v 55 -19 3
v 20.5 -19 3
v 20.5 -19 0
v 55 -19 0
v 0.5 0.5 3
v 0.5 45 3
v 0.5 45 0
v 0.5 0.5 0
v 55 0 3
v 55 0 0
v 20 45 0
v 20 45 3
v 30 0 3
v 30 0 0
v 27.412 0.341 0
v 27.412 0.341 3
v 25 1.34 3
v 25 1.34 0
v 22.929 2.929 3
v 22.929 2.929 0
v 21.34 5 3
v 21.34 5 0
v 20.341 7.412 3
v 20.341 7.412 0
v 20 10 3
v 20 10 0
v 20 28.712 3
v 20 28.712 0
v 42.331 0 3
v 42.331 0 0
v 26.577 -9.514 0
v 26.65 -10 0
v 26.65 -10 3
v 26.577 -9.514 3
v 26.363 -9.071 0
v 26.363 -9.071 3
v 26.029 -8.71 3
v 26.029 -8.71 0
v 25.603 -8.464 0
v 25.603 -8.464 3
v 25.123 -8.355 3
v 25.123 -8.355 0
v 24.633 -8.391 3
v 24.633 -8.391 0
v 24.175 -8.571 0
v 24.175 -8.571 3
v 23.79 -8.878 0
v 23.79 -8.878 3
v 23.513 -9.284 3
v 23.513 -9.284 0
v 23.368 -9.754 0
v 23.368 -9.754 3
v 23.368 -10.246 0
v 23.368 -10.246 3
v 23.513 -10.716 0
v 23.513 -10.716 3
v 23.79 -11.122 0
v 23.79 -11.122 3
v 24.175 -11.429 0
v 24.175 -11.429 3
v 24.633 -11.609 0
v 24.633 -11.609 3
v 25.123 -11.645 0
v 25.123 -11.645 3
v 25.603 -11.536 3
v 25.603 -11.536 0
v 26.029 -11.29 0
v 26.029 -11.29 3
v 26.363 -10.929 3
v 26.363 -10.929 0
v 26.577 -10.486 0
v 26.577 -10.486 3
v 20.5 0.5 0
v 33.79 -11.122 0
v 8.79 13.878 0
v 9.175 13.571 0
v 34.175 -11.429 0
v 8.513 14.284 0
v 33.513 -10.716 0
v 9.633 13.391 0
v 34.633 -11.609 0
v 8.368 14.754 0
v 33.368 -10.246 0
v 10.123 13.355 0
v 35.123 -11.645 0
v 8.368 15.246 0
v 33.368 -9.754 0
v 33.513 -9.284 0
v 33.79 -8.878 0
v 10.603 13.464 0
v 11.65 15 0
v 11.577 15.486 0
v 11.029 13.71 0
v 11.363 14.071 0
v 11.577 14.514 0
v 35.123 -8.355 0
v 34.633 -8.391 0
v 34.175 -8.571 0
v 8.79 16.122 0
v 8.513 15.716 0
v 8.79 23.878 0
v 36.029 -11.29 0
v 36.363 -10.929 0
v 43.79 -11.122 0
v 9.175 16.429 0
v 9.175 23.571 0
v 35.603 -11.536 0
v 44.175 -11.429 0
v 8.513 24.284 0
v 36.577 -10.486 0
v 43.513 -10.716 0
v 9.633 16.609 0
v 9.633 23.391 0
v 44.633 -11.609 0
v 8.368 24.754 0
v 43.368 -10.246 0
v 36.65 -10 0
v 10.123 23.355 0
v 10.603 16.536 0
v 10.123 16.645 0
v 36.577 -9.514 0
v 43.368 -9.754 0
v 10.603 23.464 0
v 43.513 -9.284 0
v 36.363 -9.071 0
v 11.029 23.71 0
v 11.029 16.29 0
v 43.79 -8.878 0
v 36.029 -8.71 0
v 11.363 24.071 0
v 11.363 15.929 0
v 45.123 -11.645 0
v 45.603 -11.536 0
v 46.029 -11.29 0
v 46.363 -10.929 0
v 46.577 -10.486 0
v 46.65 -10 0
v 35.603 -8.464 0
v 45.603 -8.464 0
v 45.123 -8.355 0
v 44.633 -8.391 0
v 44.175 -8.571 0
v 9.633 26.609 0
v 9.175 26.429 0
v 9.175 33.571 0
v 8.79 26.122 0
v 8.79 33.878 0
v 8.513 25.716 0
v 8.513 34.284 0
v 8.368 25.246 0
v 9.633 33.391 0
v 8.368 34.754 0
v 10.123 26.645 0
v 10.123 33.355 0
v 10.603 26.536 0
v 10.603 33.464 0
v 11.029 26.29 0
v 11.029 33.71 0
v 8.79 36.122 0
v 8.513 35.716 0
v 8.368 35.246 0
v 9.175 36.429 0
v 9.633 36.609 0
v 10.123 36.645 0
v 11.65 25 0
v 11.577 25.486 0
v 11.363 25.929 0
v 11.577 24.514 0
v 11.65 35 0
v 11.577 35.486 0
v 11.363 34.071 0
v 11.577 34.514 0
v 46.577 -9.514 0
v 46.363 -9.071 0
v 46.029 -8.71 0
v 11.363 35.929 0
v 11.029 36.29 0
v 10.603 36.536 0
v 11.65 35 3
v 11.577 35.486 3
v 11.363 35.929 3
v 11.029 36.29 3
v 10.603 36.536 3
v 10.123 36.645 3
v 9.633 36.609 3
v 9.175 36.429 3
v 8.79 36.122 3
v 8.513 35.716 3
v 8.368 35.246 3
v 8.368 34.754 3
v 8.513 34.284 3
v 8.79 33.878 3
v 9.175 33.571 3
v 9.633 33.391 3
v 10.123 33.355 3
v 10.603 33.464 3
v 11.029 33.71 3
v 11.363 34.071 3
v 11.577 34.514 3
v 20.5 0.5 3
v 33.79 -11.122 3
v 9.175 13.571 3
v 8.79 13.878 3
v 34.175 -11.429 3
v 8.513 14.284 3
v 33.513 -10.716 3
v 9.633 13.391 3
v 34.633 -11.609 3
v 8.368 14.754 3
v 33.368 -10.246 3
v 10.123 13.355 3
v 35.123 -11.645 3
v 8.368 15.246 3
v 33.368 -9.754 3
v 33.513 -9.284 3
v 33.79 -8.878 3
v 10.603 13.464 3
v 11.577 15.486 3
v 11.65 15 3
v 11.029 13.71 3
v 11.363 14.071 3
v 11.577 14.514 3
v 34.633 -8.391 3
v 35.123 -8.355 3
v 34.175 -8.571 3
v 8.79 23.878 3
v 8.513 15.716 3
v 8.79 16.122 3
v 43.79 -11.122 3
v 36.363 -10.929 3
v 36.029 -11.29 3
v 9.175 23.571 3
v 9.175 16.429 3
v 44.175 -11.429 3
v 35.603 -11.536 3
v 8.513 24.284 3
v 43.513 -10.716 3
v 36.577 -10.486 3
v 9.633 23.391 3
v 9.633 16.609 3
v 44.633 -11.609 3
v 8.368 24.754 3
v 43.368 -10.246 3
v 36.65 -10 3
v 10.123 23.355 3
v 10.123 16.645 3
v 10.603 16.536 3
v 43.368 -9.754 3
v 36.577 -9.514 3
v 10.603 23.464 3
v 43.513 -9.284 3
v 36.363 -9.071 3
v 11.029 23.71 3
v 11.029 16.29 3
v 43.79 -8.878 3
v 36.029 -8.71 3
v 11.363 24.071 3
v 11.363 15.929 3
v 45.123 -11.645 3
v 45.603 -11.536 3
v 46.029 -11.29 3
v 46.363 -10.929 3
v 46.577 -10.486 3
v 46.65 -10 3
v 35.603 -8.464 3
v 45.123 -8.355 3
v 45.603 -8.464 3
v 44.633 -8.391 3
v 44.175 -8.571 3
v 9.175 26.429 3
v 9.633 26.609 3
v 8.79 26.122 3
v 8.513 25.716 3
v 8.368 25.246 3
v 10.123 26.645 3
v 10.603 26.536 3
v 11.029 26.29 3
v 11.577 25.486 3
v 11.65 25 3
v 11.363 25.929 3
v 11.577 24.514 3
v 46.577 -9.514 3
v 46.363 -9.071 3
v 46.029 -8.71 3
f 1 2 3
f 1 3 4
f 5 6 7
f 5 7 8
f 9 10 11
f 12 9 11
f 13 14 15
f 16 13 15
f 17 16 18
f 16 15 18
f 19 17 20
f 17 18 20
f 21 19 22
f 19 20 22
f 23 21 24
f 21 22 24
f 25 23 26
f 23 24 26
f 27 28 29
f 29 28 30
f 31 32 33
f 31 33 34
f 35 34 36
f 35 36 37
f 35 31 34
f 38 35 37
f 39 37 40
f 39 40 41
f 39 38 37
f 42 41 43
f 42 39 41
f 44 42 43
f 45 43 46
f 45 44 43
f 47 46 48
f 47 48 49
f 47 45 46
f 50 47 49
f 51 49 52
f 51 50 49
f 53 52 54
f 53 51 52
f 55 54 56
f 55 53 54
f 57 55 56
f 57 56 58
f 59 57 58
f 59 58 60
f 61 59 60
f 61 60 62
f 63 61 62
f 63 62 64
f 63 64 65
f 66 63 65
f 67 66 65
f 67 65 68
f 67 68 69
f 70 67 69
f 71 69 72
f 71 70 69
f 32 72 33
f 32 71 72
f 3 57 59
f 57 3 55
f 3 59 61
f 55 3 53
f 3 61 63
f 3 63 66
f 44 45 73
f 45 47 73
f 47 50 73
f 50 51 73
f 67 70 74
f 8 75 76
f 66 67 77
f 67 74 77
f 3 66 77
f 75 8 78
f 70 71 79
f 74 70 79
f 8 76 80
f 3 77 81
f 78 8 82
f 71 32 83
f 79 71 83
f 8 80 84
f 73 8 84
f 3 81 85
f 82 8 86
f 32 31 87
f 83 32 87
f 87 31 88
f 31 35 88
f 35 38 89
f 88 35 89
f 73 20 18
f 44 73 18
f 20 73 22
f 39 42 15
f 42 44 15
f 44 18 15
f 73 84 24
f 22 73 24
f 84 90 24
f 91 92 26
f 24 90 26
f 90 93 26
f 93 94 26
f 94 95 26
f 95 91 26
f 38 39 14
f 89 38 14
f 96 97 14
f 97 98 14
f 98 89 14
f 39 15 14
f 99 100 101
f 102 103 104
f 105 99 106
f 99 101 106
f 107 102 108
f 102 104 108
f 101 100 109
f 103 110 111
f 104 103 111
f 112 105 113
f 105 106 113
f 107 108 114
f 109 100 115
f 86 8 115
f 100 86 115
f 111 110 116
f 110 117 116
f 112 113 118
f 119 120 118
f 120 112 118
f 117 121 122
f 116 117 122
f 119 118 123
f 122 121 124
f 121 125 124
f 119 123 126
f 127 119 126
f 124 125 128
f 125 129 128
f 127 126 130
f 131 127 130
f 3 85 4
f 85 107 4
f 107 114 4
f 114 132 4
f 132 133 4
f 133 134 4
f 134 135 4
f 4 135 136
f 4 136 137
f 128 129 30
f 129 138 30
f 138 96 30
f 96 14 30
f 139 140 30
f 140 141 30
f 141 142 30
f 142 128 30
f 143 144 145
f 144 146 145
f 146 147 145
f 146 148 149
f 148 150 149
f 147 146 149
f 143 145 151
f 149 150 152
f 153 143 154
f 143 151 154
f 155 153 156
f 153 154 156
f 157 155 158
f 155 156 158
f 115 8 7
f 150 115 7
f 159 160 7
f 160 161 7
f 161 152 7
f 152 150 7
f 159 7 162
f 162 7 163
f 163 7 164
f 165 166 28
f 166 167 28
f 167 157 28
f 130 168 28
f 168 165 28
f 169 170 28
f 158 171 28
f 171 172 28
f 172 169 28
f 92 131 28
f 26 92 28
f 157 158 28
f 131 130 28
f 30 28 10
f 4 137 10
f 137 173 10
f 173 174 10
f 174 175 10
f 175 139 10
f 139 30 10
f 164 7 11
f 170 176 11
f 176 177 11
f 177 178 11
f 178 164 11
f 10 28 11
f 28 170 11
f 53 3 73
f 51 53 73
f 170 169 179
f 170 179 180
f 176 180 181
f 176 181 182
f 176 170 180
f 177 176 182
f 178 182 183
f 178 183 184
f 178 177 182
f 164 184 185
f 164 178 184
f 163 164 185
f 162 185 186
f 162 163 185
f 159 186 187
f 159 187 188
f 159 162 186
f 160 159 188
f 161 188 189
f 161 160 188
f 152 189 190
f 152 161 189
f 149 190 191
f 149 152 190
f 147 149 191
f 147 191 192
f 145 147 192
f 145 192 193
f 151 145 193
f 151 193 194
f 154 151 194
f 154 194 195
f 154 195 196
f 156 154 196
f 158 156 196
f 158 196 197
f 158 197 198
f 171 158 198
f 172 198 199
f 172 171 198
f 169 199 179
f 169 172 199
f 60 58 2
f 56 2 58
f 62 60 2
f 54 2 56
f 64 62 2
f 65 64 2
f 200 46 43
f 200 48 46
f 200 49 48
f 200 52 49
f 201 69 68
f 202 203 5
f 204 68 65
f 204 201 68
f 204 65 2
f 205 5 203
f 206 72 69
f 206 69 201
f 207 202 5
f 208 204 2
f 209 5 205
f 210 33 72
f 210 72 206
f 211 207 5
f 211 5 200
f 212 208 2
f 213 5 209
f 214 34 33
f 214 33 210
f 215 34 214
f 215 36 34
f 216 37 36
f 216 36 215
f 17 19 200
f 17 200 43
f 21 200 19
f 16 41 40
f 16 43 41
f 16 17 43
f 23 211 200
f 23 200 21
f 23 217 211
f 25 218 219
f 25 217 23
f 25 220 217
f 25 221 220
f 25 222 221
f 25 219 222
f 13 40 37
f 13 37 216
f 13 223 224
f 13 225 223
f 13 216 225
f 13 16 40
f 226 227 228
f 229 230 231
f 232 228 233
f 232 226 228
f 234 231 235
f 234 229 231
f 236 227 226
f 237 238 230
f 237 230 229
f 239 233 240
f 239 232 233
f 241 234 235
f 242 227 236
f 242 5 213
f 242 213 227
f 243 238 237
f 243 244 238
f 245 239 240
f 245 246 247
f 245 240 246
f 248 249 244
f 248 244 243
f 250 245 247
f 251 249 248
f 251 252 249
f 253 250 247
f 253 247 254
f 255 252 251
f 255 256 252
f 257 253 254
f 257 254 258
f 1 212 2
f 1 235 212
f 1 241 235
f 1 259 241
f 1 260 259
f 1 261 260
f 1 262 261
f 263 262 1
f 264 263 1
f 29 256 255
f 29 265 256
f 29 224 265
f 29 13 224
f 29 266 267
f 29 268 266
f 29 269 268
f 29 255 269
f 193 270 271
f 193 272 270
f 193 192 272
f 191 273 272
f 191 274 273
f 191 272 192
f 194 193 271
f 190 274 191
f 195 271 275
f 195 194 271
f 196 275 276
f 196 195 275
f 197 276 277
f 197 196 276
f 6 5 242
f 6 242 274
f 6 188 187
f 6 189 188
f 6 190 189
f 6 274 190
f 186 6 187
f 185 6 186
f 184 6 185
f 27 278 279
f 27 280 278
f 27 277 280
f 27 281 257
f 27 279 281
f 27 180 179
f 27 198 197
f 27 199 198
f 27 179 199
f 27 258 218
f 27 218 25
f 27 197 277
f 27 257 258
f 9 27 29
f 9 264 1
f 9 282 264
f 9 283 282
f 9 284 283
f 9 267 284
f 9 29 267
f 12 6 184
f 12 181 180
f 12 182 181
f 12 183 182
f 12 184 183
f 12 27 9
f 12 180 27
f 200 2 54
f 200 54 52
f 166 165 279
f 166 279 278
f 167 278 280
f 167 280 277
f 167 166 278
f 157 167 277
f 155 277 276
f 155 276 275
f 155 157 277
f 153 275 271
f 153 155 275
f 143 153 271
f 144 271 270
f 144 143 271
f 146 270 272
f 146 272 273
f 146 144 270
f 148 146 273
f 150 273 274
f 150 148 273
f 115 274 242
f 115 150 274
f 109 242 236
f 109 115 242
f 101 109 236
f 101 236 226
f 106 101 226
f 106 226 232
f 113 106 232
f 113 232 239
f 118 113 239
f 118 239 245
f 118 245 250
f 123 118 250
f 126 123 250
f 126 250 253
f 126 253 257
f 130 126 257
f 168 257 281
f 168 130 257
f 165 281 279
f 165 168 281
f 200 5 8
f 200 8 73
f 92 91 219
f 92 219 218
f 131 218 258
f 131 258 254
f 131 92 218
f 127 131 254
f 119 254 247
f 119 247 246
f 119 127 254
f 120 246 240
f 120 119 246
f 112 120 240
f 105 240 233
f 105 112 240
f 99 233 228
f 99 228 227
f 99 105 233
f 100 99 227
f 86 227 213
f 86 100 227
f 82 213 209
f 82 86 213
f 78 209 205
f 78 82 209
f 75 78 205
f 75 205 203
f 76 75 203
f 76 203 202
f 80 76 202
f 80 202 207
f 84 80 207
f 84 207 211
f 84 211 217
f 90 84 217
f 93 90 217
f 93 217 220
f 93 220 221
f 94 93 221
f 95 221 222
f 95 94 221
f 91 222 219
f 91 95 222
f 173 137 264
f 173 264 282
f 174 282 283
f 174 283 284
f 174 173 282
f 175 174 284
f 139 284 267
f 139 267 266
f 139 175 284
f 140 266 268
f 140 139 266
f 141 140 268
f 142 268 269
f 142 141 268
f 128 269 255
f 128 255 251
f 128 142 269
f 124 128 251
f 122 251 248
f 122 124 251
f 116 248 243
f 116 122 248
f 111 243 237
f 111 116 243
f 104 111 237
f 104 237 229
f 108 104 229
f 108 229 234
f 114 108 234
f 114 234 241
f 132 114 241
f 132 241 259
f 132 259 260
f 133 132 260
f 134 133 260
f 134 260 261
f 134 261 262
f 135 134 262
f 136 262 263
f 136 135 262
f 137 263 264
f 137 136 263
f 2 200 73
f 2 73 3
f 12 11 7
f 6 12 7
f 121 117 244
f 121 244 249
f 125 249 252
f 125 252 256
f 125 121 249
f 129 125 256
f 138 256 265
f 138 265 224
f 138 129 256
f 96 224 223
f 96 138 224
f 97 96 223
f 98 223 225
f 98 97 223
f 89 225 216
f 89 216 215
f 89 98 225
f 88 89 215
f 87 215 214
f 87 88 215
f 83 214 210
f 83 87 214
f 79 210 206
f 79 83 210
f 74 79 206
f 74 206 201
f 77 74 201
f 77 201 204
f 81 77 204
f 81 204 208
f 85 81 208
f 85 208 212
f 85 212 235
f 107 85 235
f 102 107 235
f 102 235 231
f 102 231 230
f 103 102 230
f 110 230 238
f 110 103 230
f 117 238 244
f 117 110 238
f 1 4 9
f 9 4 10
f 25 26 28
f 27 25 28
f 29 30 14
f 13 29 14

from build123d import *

# Parameters (mm, degrees)
SKETCH_1_R          = 1.65
EXTRUDE_1_DEPTH     = 3
CUT_EXTRUDE_1_DEPTH = 10


with BuildPart() as part:
    # 草图1 → 凸台-拉伸1 (new body)
    with BuildSketch(Plane.XY):
        Polygon((0, 0), (20, 0), (20, -20), (55, -20), (55, 0), (20, 45), (0, 45), align=None)
        with Locations((10, 15)):
            Circle(SKETCH_1_R, mode=Mode.SUBTRACT)
        with Locations((10, 35)):
            Circle(SKETCH_1_R, mode=Mode.SUBTRACT)
        with Locations((10, 25)):
            Circle(SKETCH_1_R, mode=Mode.SUBTRACT)
        with Locations((25, -10)):
            Circle(SKETCH_1_R, mode=Mode.SUBTRACT)
        with Locations((35, -10)):
            Circle(SKETCH_1_R, mode=Mode.SUBTRACT)
        with Locations((45, -10)):
            Circle(SKETCH_1_R, mode=Mode.SUBTRACT)
        with BuildLine():
            Line((20, 10), (20, 28.711779641))
            Line((20, 28.711779641), (42.331384166, 0))
            Line((42.331384166, 0), (30, 0))
            ThreePointArc((30, 0), (22.928932188, 2.928932188), (20, 10))
        make_face(mode=Mode.SUBTRACT)
    extrude(amount=EXTRUDE_1_DEPTH)

    # 草图2 → 切除-拉伸1 (cut)
    with BuildSketch(Plane.XY.offset(3)):
        Polygon((20.5, -19), (61.4403438, -19), (61.4403438, -24.760517067), (16.601724468, -23.670689514), (0, 0), (-5.850932492, 46.668097056), (0.5, 47.42662584), (0.5, 0.5), (20.5, 0.5), align=None)
    extrude(amount=-CUT_EXTRUDE_1_DEPTH, mode=Mode.SUBTRACT)


solid = part.part
